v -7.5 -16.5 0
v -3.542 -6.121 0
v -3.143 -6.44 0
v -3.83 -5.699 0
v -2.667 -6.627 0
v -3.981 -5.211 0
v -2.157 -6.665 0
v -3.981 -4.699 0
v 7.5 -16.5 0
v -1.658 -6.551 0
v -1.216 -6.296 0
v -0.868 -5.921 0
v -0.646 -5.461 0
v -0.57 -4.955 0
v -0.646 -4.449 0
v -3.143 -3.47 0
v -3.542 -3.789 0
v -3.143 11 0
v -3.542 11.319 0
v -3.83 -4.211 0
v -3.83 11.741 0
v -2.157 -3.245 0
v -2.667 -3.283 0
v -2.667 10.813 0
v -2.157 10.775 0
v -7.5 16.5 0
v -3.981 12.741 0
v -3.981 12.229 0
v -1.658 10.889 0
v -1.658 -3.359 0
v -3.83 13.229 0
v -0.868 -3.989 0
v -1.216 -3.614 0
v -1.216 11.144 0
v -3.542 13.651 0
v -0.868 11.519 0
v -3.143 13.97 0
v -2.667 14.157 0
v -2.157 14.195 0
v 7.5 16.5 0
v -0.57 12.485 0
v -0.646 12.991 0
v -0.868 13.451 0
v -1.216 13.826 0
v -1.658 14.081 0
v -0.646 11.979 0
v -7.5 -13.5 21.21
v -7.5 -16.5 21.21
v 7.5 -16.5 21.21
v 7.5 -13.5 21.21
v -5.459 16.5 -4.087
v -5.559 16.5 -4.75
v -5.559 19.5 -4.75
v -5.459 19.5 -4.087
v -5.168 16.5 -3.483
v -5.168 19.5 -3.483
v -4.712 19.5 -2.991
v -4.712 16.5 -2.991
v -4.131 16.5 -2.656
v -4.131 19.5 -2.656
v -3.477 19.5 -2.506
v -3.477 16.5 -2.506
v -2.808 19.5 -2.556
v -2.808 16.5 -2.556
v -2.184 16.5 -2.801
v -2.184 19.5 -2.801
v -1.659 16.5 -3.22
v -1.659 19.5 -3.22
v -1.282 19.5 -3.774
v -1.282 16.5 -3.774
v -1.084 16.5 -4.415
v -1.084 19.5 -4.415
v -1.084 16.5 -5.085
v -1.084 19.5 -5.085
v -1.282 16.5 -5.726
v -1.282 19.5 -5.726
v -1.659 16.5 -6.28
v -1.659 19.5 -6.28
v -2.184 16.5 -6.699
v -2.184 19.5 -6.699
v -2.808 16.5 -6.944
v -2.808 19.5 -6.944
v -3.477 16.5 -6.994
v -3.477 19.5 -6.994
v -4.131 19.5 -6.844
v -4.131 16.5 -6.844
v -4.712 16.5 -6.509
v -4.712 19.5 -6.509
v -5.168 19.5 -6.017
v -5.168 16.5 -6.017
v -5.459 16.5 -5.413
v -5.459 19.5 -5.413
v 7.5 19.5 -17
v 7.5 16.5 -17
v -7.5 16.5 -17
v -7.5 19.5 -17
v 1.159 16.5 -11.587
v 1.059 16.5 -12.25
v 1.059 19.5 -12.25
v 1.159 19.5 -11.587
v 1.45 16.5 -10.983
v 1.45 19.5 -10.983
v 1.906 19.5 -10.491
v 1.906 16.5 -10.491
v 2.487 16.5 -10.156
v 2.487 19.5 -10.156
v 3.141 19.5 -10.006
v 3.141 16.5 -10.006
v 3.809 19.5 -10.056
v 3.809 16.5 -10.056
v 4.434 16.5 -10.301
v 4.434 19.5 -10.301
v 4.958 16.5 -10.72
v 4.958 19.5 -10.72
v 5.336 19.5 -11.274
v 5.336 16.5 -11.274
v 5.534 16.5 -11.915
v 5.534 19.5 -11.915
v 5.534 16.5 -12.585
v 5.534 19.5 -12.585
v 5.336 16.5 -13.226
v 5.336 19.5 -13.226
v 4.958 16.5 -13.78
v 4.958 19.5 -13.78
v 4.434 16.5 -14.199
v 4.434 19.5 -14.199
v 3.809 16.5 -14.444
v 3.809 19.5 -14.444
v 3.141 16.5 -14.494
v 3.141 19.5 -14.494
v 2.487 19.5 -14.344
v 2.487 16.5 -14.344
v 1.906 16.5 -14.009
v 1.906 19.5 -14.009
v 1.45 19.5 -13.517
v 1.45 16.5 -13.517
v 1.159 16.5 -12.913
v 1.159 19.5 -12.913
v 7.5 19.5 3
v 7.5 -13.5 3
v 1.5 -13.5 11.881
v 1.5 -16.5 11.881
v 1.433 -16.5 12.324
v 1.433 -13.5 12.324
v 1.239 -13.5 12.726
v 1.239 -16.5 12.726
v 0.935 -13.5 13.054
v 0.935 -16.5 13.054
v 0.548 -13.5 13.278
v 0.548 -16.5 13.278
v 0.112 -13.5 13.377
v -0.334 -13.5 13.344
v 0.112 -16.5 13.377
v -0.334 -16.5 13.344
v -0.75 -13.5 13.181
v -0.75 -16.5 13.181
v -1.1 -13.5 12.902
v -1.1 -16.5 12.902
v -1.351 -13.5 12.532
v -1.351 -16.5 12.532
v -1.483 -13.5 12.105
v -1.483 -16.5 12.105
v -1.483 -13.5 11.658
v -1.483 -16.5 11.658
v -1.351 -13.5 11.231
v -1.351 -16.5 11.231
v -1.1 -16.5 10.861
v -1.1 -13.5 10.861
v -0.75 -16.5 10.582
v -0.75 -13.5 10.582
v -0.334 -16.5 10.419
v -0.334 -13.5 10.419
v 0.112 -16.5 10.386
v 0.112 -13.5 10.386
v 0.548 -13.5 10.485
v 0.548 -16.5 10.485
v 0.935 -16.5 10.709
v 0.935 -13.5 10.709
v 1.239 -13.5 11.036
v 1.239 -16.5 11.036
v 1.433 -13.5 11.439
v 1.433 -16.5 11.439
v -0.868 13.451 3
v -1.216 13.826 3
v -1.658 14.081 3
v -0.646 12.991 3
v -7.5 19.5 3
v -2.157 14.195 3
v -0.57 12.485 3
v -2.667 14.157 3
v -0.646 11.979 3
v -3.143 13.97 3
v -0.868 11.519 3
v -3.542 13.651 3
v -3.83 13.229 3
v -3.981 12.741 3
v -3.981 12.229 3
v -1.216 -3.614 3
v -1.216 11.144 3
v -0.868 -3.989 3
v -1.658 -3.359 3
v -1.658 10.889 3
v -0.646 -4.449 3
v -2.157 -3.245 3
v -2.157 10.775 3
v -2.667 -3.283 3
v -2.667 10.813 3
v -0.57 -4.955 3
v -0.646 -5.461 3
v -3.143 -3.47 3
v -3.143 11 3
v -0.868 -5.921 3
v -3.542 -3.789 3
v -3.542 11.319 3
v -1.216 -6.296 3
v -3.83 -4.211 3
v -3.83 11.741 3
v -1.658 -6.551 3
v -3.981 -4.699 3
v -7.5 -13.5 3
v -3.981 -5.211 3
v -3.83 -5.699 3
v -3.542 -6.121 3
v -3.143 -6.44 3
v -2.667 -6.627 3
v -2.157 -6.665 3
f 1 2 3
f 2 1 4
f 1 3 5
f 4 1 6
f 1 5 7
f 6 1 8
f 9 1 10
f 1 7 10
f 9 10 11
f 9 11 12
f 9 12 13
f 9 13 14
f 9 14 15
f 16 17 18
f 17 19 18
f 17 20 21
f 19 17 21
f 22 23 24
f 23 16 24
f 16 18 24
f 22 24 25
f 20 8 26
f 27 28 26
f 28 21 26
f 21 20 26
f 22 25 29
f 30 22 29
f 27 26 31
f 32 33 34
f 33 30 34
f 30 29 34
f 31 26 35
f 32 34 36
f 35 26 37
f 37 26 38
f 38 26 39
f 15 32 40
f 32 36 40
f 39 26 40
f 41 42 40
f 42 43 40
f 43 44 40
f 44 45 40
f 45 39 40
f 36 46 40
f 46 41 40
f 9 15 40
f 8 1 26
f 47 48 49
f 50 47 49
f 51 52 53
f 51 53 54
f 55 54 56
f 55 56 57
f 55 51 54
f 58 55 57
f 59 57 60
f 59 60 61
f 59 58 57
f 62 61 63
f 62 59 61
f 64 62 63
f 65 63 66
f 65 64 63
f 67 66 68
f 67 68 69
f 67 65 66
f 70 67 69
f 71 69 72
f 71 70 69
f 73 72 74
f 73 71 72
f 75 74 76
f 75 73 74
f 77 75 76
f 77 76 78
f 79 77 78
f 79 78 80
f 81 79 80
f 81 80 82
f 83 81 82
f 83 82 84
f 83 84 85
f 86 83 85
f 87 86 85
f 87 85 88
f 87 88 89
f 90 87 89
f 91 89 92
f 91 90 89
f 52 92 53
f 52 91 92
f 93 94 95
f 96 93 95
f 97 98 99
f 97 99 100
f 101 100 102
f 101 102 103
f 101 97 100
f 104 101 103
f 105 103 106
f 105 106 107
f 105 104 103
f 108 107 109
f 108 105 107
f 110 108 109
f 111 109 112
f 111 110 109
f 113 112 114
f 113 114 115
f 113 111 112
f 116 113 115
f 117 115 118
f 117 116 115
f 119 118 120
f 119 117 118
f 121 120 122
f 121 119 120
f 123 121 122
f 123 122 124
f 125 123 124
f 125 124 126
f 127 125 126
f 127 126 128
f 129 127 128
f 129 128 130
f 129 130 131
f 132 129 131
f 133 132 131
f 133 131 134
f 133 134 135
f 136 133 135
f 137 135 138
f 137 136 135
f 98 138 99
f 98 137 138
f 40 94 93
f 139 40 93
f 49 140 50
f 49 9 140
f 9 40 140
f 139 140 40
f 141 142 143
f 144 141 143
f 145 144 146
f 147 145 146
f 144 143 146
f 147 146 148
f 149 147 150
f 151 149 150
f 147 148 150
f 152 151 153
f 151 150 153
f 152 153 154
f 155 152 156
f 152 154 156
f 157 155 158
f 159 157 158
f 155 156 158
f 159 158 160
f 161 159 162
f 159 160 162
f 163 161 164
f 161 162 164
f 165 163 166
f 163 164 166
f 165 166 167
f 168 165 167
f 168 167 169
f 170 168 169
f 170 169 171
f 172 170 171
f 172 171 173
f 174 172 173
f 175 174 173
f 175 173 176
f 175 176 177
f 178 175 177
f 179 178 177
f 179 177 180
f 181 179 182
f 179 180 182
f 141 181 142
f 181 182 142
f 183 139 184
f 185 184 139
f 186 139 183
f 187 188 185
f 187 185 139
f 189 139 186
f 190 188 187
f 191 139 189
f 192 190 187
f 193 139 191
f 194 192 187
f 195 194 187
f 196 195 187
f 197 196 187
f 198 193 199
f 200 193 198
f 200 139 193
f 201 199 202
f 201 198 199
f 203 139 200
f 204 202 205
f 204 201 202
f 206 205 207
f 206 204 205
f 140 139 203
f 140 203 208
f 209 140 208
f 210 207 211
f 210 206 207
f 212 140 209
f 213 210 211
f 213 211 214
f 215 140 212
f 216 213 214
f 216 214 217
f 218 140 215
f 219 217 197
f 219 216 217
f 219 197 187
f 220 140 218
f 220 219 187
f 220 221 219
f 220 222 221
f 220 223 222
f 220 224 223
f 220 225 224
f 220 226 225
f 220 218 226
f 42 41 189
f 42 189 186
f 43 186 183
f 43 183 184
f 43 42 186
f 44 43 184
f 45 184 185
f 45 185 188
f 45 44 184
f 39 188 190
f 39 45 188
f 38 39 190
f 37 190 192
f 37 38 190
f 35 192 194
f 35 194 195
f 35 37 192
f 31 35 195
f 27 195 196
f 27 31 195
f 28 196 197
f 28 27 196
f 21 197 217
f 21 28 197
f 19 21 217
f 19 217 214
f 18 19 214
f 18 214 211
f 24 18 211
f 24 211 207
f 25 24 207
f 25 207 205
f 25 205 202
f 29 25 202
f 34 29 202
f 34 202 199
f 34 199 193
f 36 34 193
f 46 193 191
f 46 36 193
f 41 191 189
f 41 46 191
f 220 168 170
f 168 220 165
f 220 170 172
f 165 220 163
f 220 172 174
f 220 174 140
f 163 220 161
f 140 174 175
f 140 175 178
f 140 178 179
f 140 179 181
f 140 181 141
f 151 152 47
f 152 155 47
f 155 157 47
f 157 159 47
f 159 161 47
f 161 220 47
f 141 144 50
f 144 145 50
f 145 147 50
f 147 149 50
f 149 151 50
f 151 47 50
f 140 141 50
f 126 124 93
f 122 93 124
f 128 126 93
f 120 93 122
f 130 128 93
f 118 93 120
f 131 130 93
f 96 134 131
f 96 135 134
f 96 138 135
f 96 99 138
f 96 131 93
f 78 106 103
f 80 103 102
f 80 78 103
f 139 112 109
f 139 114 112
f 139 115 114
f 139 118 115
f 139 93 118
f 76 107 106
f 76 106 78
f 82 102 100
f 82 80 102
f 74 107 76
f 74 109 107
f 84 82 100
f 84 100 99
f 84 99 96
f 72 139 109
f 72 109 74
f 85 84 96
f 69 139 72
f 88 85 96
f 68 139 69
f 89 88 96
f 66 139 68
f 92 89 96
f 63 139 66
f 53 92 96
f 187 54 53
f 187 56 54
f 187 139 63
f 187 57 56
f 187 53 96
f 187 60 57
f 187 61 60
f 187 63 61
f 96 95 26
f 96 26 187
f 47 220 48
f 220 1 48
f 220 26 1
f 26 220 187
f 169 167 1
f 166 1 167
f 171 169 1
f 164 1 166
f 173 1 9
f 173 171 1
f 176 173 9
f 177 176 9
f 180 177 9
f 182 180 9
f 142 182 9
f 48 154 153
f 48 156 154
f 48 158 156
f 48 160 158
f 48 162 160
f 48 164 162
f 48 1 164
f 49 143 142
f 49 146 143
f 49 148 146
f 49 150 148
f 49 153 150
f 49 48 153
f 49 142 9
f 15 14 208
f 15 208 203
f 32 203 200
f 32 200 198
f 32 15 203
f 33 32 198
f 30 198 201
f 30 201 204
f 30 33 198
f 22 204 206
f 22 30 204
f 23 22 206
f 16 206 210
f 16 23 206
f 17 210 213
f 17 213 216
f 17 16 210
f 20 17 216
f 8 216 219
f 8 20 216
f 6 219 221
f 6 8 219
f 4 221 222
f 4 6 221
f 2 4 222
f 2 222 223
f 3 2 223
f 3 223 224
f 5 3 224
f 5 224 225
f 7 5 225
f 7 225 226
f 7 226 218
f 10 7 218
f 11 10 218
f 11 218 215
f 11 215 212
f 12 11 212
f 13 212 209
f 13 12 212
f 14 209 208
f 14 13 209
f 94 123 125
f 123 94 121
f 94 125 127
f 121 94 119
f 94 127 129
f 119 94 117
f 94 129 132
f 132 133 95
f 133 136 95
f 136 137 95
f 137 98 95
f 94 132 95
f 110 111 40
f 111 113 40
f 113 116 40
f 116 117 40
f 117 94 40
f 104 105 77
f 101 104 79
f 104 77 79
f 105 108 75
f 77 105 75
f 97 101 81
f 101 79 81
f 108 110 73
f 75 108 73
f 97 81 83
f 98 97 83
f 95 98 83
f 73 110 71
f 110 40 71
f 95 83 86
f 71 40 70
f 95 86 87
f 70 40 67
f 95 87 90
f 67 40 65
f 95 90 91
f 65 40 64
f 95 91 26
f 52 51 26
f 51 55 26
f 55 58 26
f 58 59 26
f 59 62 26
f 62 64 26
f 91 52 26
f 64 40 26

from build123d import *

# Parameters (mm, degrees)
F0_W     = 15
F0_H     = 33
F0_R     = 1.715
F1_DEPTH = 3
F2_W     = 15
F2_H     = 20
F2_R     = 2.25
F3_DEPTH = 3
F4_W     = 15
F4_H     = 18.209726
F4_R     = 1.5
F5_DEPTH = 3


with BuildPart() as f1:
    # F0 (on Top) → F1 (new body)
    with BuildSketch(Plane.XY):
        Rectangle(F0_W, F0_H)
        with Locations((-2.285, -4.955)):
            Circle(F0_R, mode=Mode.SUBTRACT)
        with Locations((-2.285, 12.485)):
            Circle(F0_R, mode=Mode.SUBTRACT)
    extrude(amount=F1_DEPTH)

    # F2 (on face) → F3 (join)
    with BuildSketch(Plane(origin=(0, 16.5, 0), x_dir=(-1, 0, 0), z_dir=(0, 1, 0))):
        with Locations((0, -7)):
            Rectangle(F2_W, F2_H)
        with Locations((-3.308824, -12.25)):
            Circle(F2_R, mode=Mode.SUBTRACT)
        with Locations((3.308824, -4.75)):
            Circle(F2_R, mode=Mode.SUBTRACT)
    extrude(amount=F3_DEPTH)

    # F4 (on face) → F5 (join)
    with BuildSketch(Plane.XZ.offset(16.5)):
        with Locations((0, 12.104863)):
            Rectangle(F4_W, F4_H)
        with Locations((0, 11.881463)):
            Circle(F4_R, mode=Mode.SUBTRACT)
    extrude(amount=-F5_DEPTH)


solid = f1.part
